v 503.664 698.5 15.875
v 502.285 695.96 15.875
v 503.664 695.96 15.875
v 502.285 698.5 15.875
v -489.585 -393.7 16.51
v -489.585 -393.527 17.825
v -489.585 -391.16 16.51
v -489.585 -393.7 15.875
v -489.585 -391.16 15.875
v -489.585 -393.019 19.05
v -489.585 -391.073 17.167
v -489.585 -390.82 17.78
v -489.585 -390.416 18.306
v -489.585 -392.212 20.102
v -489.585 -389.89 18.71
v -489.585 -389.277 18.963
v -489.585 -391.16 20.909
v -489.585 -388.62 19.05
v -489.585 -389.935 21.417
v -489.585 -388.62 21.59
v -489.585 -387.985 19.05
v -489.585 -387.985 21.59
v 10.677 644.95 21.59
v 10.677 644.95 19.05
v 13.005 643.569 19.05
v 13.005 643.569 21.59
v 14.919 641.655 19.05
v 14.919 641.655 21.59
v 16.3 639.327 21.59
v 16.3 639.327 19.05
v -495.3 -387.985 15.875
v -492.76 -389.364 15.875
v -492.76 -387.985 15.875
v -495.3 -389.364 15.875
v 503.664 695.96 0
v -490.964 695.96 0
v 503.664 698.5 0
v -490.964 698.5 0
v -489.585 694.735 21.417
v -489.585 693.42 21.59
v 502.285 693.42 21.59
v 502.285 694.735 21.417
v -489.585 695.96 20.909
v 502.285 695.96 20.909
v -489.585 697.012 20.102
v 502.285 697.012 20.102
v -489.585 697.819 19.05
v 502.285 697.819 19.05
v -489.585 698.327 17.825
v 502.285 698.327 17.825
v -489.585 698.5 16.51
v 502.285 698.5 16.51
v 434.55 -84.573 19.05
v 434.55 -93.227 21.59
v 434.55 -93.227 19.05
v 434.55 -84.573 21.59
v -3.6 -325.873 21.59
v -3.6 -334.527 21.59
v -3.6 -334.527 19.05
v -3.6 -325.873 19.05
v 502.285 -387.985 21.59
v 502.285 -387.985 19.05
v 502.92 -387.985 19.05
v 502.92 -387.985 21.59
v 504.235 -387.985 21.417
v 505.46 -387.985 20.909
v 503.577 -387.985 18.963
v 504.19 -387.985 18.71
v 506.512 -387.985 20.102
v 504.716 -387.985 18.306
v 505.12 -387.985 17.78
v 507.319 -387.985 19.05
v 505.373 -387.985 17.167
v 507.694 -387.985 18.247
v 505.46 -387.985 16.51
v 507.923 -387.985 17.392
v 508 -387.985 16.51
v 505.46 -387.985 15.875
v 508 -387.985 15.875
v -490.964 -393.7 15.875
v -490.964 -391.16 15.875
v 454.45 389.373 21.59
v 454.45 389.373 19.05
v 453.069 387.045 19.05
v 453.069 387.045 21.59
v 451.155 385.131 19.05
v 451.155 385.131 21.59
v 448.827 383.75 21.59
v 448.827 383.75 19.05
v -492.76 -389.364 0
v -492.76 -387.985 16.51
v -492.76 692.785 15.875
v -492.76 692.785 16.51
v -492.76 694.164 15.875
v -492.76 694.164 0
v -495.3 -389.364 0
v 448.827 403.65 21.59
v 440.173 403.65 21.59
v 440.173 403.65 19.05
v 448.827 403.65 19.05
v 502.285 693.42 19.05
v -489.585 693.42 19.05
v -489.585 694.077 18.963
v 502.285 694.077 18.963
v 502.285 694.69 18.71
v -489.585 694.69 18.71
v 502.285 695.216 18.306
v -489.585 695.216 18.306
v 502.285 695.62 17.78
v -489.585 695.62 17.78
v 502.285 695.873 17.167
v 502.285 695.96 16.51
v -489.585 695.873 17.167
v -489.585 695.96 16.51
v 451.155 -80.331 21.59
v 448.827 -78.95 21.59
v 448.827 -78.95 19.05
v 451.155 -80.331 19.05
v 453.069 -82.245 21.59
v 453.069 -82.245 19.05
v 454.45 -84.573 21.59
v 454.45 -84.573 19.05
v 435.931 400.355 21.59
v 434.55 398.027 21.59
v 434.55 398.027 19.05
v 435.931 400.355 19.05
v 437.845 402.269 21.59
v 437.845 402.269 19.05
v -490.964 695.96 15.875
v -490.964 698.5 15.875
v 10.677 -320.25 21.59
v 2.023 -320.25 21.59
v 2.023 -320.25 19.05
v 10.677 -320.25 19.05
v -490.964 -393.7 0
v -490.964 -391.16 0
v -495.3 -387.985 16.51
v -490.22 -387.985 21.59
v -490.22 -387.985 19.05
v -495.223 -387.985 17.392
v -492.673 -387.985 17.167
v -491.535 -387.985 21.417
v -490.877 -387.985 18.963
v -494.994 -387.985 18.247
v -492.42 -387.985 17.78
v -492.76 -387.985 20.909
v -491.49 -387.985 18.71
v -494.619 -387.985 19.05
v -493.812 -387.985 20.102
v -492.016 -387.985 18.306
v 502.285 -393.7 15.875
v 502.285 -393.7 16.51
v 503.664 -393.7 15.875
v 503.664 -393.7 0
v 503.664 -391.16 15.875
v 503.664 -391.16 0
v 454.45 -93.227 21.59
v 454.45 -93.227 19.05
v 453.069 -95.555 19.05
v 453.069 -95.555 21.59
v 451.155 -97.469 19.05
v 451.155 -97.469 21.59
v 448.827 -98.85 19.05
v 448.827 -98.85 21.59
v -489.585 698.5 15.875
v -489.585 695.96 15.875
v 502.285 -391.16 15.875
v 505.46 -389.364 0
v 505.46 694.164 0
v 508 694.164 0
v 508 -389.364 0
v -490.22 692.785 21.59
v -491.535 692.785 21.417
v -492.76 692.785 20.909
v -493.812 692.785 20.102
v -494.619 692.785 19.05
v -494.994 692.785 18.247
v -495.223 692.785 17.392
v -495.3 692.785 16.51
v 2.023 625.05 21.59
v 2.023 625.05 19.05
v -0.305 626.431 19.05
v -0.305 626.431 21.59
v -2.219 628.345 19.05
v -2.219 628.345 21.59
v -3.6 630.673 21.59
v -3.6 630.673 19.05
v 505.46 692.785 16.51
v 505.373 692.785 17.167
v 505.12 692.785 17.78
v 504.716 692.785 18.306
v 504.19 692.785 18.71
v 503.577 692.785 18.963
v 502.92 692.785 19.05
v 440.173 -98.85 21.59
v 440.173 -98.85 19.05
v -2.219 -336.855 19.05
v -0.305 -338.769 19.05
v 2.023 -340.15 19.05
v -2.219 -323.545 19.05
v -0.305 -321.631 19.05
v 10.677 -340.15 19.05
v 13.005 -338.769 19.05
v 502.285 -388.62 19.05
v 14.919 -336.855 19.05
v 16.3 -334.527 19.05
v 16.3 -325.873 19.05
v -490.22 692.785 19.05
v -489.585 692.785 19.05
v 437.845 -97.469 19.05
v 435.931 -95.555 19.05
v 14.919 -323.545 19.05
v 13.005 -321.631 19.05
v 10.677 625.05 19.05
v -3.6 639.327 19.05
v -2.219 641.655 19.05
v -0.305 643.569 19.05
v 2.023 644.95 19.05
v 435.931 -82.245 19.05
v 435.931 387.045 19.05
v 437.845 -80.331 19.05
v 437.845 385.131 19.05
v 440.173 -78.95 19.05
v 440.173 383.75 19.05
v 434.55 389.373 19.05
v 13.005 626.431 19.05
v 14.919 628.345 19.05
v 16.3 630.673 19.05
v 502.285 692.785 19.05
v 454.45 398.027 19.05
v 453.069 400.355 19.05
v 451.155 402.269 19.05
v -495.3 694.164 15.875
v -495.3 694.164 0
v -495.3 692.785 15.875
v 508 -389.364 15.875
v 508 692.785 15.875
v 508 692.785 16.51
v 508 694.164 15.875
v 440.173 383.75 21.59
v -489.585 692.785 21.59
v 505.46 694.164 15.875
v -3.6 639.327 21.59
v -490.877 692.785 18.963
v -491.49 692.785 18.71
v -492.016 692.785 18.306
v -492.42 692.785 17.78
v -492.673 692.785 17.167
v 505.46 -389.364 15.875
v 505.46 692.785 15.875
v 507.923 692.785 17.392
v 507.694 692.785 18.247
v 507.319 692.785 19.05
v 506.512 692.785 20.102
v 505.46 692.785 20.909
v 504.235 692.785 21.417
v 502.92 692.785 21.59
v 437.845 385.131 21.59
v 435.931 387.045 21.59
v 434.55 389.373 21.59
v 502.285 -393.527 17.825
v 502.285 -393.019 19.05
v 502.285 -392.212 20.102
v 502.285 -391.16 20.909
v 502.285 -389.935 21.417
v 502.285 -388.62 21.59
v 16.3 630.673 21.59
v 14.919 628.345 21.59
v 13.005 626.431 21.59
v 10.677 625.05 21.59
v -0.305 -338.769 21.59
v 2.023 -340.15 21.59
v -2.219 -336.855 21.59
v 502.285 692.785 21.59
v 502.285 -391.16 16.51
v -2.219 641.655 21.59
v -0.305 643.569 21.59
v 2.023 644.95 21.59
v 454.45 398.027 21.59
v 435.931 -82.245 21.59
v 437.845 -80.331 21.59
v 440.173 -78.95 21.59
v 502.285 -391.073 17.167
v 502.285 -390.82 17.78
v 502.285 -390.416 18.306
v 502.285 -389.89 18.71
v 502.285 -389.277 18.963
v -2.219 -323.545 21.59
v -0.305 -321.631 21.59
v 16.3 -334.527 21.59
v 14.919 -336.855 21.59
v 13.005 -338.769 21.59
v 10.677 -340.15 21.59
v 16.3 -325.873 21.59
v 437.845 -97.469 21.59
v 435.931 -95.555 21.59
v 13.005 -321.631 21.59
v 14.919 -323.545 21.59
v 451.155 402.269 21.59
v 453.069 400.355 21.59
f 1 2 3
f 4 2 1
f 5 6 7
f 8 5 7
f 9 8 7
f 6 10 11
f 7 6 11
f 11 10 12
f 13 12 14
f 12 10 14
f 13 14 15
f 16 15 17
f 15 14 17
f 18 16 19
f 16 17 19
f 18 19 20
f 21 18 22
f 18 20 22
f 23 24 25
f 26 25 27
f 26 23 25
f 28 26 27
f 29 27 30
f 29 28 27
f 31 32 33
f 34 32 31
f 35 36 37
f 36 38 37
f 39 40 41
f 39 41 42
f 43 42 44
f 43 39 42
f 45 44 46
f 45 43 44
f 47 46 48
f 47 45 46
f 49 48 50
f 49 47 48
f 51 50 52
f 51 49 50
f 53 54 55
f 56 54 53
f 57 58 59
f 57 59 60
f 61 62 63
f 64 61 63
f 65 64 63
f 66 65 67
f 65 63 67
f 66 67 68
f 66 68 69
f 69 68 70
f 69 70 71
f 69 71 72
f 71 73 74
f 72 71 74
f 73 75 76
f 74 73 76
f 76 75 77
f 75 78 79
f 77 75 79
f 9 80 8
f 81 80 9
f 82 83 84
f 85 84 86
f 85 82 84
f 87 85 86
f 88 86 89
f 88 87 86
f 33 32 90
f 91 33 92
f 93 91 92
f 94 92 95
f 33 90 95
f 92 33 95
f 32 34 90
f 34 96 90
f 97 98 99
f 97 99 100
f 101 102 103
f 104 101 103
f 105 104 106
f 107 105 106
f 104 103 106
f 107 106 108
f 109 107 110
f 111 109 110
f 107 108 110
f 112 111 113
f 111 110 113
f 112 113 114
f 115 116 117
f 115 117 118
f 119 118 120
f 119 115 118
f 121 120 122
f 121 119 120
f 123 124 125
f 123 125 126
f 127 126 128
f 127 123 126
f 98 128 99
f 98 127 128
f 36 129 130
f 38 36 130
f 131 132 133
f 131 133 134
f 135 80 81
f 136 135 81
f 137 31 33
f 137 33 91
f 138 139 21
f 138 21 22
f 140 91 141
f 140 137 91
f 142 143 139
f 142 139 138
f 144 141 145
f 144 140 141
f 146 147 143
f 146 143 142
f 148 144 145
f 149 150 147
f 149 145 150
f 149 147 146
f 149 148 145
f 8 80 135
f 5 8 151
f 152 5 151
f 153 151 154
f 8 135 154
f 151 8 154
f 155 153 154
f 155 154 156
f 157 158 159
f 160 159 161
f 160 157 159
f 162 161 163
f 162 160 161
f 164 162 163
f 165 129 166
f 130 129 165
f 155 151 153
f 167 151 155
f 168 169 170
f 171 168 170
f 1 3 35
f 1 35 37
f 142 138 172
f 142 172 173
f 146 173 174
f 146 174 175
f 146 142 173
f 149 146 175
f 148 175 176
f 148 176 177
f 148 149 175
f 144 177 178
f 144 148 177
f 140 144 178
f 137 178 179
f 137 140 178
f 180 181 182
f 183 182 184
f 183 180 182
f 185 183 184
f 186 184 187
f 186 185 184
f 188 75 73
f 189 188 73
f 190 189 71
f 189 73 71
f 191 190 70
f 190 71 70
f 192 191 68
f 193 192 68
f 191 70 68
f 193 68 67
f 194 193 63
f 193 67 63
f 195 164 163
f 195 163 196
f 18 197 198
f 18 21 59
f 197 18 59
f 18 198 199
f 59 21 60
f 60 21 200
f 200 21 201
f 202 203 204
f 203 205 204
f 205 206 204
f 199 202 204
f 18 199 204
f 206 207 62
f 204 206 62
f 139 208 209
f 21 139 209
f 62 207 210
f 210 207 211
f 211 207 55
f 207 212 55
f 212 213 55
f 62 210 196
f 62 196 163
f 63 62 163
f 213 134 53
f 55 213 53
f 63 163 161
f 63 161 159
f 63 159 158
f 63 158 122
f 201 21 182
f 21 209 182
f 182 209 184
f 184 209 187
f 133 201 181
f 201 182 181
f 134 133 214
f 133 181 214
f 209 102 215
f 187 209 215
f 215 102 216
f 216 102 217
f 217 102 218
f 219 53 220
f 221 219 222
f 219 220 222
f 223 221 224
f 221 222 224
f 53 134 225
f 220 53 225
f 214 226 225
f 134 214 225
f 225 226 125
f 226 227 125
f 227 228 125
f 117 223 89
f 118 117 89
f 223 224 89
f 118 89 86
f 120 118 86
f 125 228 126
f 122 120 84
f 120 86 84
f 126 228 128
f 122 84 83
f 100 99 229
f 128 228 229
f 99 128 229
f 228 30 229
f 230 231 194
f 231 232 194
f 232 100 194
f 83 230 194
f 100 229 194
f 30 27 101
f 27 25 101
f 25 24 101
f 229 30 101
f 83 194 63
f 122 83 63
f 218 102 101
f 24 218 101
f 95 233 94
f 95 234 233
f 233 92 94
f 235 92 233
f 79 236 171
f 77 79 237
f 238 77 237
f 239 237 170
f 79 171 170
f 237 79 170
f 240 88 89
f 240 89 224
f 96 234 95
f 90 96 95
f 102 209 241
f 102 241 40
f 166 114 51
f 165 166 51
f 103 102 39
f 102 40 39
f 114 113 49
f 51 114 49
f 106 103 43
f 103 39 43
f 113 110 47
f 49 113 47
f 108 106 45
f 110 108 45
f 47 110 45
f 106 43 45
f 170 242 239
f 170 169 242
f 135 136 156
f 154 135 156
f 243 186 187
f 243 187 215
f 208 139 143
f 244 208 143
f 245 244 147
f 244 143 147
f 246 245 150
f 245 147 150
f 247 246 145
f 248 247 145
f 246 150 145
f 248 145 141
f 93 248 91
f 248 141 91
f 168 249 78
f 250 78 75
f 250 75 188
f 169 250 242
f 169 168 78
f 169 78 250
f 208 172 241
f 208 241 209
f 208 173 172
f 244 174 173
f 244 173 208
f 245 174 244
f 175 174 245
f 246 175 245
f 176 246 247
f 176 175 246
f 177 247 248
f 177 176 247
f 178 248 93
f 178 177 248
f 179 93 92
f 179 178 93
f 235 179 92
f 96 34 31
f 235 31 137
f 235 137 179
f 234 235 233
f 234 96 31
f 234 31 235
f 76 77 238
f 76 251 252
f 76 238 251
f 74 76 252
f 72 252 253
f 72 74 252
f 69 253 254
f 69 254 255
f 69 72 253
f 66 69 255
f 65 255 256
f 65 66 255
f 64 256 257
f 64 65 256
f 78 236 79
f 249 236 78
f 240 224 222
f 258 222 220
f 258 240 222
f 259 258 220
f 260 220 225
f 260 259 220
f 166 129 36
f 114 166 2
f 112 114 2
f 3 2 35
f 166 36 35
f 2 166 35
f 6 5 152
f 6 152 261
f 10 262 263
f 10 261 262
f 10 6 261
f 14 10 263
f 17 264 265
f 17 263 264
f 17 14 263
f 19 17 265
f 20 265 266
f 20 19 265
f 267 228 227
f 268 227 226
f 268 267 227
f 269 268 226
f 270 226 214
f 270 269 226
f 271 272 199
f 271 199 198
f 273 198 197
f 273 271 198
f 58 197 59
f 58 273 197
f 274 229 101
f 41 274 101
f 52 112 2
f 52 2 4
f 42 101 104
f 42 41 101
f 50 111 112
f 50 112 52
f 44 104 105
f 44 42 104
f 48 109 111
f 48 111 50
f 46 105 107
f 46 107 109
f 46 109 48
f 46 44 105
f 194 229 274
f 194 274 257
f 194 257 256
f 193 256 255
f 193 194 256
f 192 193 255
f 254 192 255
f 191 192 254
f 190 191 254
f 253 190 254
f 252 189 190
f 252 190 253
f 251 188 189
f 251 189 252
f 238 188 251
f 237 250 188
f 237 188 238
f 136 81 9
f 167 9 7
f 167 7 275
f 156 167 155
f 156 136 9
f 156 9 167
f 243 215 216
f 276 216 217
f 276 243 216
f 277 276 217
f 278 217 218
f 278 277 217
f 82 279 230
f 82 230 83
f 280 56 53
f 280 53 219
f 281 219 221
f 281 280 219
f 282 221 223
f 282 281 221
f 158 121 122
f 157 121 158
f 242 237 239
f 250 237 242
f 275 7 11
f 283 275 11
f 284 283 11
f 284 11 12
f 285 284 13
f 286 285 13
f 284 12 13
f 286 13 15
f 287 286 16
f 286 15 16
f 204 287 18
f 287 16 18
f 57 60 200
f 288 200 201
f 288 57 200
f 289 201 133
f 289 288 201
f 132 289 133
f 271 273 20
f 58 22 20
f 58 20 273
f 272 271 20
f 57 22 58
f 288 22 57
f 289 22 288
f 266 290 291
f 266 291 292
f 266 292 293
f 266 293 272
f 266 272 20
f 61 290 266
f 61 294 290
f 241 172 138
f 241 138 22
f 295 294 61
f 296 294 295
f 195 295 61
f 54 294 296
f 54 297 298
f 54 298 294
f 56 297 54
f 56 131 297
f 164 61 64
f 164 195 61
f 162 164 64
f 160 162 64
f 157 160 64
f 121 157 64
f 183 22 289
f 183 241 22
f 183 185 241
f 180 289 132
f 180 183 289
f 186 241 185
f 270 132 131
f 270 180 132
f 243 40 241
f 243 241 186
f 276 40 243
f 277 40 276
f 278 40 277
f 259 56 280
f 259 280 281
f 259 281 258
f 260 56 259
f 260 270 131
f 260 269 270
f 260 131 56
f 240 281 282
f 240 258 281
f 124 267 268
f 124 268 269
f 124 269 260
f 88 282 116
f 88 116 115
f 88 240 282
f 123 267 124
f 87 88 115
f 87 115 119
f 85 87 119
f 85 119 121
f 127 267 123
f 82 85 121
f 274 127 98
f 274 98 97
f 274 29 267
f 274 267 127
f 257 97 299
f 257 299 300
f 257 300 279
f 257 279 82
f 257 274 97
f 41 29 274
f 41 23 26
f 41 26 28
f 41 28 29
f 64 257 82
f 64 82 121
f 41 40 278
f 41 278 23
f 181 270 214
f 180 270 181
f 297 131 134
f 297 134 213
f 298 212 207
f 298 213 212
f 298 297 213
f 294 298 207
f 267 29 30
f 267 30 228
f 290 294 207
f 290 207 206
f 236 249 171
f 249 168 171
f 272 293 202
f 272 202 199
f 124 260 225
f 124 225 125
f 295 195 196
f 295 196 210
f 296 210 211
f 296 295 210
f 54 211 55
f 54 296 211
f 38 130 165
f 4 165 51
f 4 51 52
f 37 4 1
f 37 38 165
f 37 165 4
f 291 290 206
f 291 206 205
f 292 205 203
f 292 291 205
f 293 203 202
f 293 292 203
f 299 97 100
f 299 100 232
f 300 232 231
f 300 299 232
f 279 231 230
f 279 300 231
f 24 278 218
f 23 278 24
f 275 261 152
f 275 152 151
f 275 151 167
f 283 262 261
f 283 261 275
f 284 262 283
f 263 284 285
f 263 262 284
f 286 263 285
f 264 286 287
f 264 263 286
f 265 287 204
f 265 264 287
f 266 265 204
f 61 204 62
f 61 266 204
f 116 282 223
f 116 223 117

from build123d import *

# Parameters (mm, degrees)
SKETCH1_W               = 1003.3
SKETCH1_H               = 1092.2
SKETCH1_W_2             = 998.22
SKETCH1_H_2             = 1087.12
BOSS_EXTRUDE1_DEPTH     = 21.59
SKETCH3_W               = 1003.3
SKETCH3_H               = 1092.2
BOSS_EXTRUDE2_DEPTH     = 2.54
CUT_EXTRUDE1_REACH      = 865.963
CONVERT_SOLID1_START    = -495.3
CONVERT_SOLID1_DEPTH    = 1003.3
CONVERT_SOLID1_2_DEPTH  = 4.336051224
CONVERT_SOLID1_START_2  = 503.663948776
CONVERT_SOLID1_3_DEPTH  = 4.336051224
CONVERT_SOLID1_START_3  = -490.963948776
CONVERT_SOLID1_4_DEPTH  = 1.378948776
CONVERT_SOLID1_START_4  = 502.285
CONVERT_SOLID1_5_DEPTH  = 1.378948776
CONVERT_SOLID1_START_5  = -489.585
CONVERT_SOLID1_6_DEPTH  = 991.87
CONVERT_SOLID1_START_6  = -391.16
CONVERT_SOLID1_7_DEPTH  = 1087.12
CONVERT_SOLID1_8_DEPTH  = 1.796051224
CONVERT_SOLID1_START_7  = 694.163948776
CONVERT_SOLID1_9_DEPTH  = 1.796051224
CONVERT_SOLID1_START_8  = -389.363948776
CONVERT_SOLID1_10_DEPTH = 1.378948776
CONVERT_SOLID1_START_9  = 692.785
CONVERT_SOLID1_11_DEPTH = 1.378948776
CONVERT_SOLID1_START_10 = -387.985
CONVERT_SOLID1_12_DEPTH = 1080.77


with BuildPart() as part:
    # Sketch1 → Boss-Extrude1 (new body)
    with BuildSketch(Plane.XY):
        with Locations((6.35, 152.4)):
            Rectangle(SKETCH1_W, SKETCH1_H)
        with Locations((6.35, 152.4)):
            Rectangle(SKETCH1_W_2, SKETCH1_H_2, mode=Mode.SUBTRACT)
    extrude(amount=BOSS_EXTRUDE1_DEPTH)

    # Sketch3 → Boss-Extrude2 (add)
    with BuildSketch(Plane.XY.offset(21.59)):
        with Locations((6.35, 152.4)):
            Rectangle(SKETCH3_W, SKETCH3_H)
    extrude(amount=-BOSS_EXTRUDE2_DEPTH)

    # Sketch4 → Cut-Extrude1 (cut, up to next)
    with BuildSketch(Plane.XY.offset(21.59), mode=Mode.PRIVATE) as cut_extrude1_sk1:
        with BuildLine():
            Line((440.173338469, 403.65), (448.826661531, 403.65))
            ThreePointArc((448.826661531, 403.65), (452.172108576, 401.372108576), (454.45, 398.026661531))
            Line((454.45, 398.026661531), (454.45, 389.373338469))
            ThreePointArc((454.45, 389.373338469), (452.172108576, 386.027891424), (448.826661531, 383.75))
            Line((448.826661531, 383.75), (440.173338469, 383.75))
            ThreePointArc((440.173338469, 383.75), (436.827891424, 386.027891424), (434.55, 389.373338469))
            Line((434.55, 389.373338469), (434.55, 398.026661531))
            ThreePointArc((434.55, 398.026661531), (436.827891424, 401.372108576), (440.173338469, 403.65))
        make_face()
    cut_extrude1_tool1 = extrude(cut_extrude1_sk1.sketch, amount=-CUT_EXTRUDE1_REACH, mode=Mode.PRIVATE) & part.part
    # Sketch4 → Cut-Extrude1 (cut, up to next)
    with BuildSketch(Plane.XY.offset(21.59), mode=Mode.PRIVATE) as cut_extrude1_sk2:
        with BuildLine():
            Line((440.173338469, -78.95), (448.826661531, -78.95))
            ThreePointArc((448.826661531, -78.95), (452.172108576, -81.227891424), (454.45, -84.573338469))
            Line((454.45, -84.573338469), (454.45, -93.226661531))
            ThreePointArc((454.45, -93.226661531), (452.172108576, -96.572108576), (448.826661531, -98.85))
            Line((448.826661531, -98.85), (440.173338469, -98.85))
            ThreePointArc((440.173338469, -98.85), (436.827891424, -96.572108576), (434.55, -93.226661531))
            Line((434.55, -93.226661531), (434.55, -84.573338469))
            ThreePointArc((434.55, -84.573338469), (436.827891424, -81.227891424), (440.173338469, -78.95))
        make_face()
    cut_extrude1_tool2 = extrude(cut_extrude1_sk2.sketch, amount=-CUT_EXTRUDE1_REACH, mode=Mode.PRIVATE) & part.part
    # Sketch4 → Cut-Extrude1 (cut, up to next)
    with BuildSketch(Plane.XY.offset(21.59), mode=Mode.PRIVATE) as cut_extrude1_sk3:
        with BuildLine():
            Line((2.023338469, 644.95), (10.676661531, 644.95))
            ThreePointArc((10.676661531, 644.95), (14.022108576, 642.672108576), (16.3, 639.326661531))
            Line((16.3, 639.326661531), (16.3, 630.673338469))
            ThreePointArc((16.3, 630.673338469), (14.022108576, 627.327891424), (10.676661531, 625.05))
            Line((10.676661531, 625.05), (2.023338469, 625.05))
            ThreePointArc((2.023338469, 625.05), (-1.322108576, 627.327891424), (-3.6, 630.673338469))
            Line((-3.6, 630.673338469), (-3.6, 639.326661531))
            ThreePointArc((-3.6, 639.326661531), (-1.322108576, 642.672108576), (2.023338469, 644.95))
        make_face()
    cut_extrude1_tool3 = extrude(cut_extrude1_sk3.sketch, amount=-CUT_EXTRUDE1_REACH, mode=Mode.PRIVATE) & part.part
    # Sketch4 → Cut-Extrude1 (cut, up to next)
    with BuildSketch(Plane.XY.offset(21.59), mode=Mode.PRIVATE) as cut_extrude1_sk4:
        with BuildLine():
            Line((2.023338469, -320.25), (10.676661531, -320.25))
            ThreePointArc((10.676661531, -320.25), (14.022108576, -322.527891424), (16.3, -325.873338469))
            Line((16.3, -325.873338469), (16.3, -334.526661531))
            ThreePointArc((16.3, -334.526661531), (14.022108576, -337.872108576), (10.676661531, -340.15))
            Line((10.676661531, -340.15), (2.023338469, -340.15))
            ThreePointArc((2.023338469, -340.15), (-1.322108576, -337.872108576), (-3.6, -334.526661531))
            Line((-3.6, -334.526661531), (-3.6, -325.873338469))
            ThreePointArc((-3.6, -325.873338469), (-1.322108576, -322.527891424), (2.023338469, -320.25))
        make_face()
    cut_extrude1_tool4 = extrude(cut_extrude1_sk4.sketch, amount=-CUT_EXTRUDE1_REACH, mode=Mode.PRIVATE) & part.part
    add(cut_extrude1_tool1.solids().sort_by_distance((444.5, 393.7, 21.59))[0], mode=Mode.SUBTRACT)
    add(cut_extrude1_tool2.solids().sort_by_distance((444.5, -88.9, 21.59))[0], mode=Mode.SUBTRACT)
    add(cut_extrude1_tool3.solids().sort_by_distance((6.35, 635, 21.59))[0], mode=Mode.SUBTRACT)
    add(cut_extrude1_tool4.solids().sort_by_distance((6.35, -330.2, 21.59))[0], mode=Mode.SUBTRACT)

    # Convert-Solid1: read off the stored shape, not the designer's step
    # Convert-Solid1 outline → Convert-Solid1 (cut)
    with BuildSketch(Plane.YZ.offset(CONVERT_SOLID1_START)):
        with BuildLine():
            ThreePointArc((-393.7, 16.51), (-392.212102448, 20.102102448), (-388.62, 21.59))
            Line((-388.62, 21.59), (-393.7, 21.59))
            Line((-393.7, 21.59), (-393.7, 16.51))
        make_face()
        with BuildLine():
            Line((698.5, 21.59), (693.42, 21.59))
            ThreePointArc((693.42, 21.59), (697.012102448, 20.102102448), (698.5, 16.51))
            Line((698.5, 16.51), (698.5, 21.59))
        make_face()
    extrude(amount=CONVERT_SOLID1_DEPTH, mode=Mode.SUBTRACT)

    # Convert-Solid1 2 outline → Convert-Solid1 2 (cut)
    with BuildSketch(Plane.YZ.offset(CONVERT_SOLID1_START)):
        with BuildLine():
            Line((-388.62, 19.05), (-387.985, 19.05))
            Line((-387.985, 19.05), (-387.985, 21.59))
            Line((-387.985, 21.59), (-388.62, 21.59))
            ThreePointArc((-388.62, 21.59), (-392.212102448, 20.102102448), (-393.7, 16.51))
            Line((-393.7, 16.51), (-393.7, 0))
            Line((-393.7, 0), (-391.16, 0))
            Line((-391.16, 0), (-391.16, 16.51))
            ThreePointArc((-391.16, 16.51), (-390.416051224, 18.306051224), (-388.62, 19.05))
        make_face()
        with BuildLine():
            Line((692.785, 21.59), (692.785, 19.05))
            Line((692.785, 19.05), (693.42, 19.05))
            ThreePointArc((693.42, 19.05), (695.216051224, 18.306051224), (695.96, 16.51))
            Line((695.96, 16.51), (695.96, 0))
            Line((695.96, 0), (698.5, 0))
            Line((698.5, 0), (698.5, 16.51))
            ThreePointArc((698.5, 16.51), (697.012102448, 20.102102448), (693.42, 21.59))
            Line((693.42, 21.59), (692.785, 21.59))
        make_face()
    extrude(amount=CONVERT_SOLID1_2_DEPTH, mode=Mode.SUBTRACT)

    # Convert-Solid1 3 outline → Convert-Solid1 3 (cut)
    with BuildSketch(Plane.YZ.offset(CONVERT_SOLID1_START_2)):
        with BuildLine():
            Line((-388.62, 19.05), (-387.985, 19.05))
            Line((-387.985, 19.05), (-387.985, 21.59))
            Line((-387.985, 21.59), (-388.62, 21.59))
            ThreePointArc((-388.62, 21.59), (-392.212102448, 20.102102448), (-393.7, 16.51))
            Line((-393.7, 16.51), (-393.7, 0))
            Line((-393.7, 0), (-391.16, 0))
            Line((-391.16, 0), (-391.16, 16.51))
            ThreePointArc((-391.16, 16.51), (-390.416051224, 18.306051224), (-388.62, 19.05))
        make_face()
        with BuildLine():
            Line((692.785, 21.59), (692.785, 19.05))
            Line((692.785, 19.05), (693.42, 19.05))
            ThreePointArc((693.42, 19.05), (695.216051224, 18.306051224), (695.96, 16.51))
            Line((695.96, 16.51), (695.96, 0))
            Line((695.96, 0), (698.5, 0))
            Line((698.5, 0), (698.5, 16.51))
            ThreePointArc((698.5, 16.51), (697.012102448, 20.102102448), (693.42, 21.59))
            Line((693.42, 21.59), (692.785, 21.59))
        make_face()
    extrude(amount=CONVERT_SOLID1_3_DEPTH, mode=Mode.SUBTRACT)

    # Convert-Solid1 4 outline → Convert-Solid1 4 (cut)
    with BuildSketch(Plane.YZ.offset(CONVERT_SOLID1_START_3)):
        with BuildLine():
            Line((-391.16, 19.05), (-387.985, 19.05))
            Line((-387.985, 19.05), (-387.985, 21.59))
            Line((-387.985, 21.59), (-388.62, 21.59))
            ThreePointArc((-388.62, 21.59), (-392.212102448, 20.102102448), (-393.7, 16.51))
            Line((-393.7, 16.51), (-393.7, 15.875))
            Line((-393.7, 15.875), (-391.16, 15.875))
            Line((-391.16, 15.875), (-391.16, 19.05))
        make_face()
        with BuildLine():
            Line((692.785, 21.59), (692.785, 19.05))
            Line((692.785, 19.05), (695.96, 19.05))
            Line((695.96, 19.05), (695.96, 15.875))
            Line((695.96, 15.875), (698.5, 15.875))
            Line((698.5, 15.875), (698.5, 16.51))
            ThreePointArc((698.5, 16.51), (697.012102448, 20.102102448), (693.42, 21.59))
            Line((693.42, 21.59), (692.785, 21.59))
        make_face()
    extrude(amount=CONVERT_SOLID1_4_DEPTH, mode=Mode.SUBTRACT)

    # Convert-Solid1 5 outline → Convert-Solid1 5 (cut)
    with BuildSketch(Plane.YZ.offset(CONVERT_SOLID1_START_4)):
        with BuildLine():
            Line((-391.16, 19.05), (-387.985, 19.05))
            Line((-387.985, 19.05), (-387.985, 21.59))
            Line((-387.985, 21.59), (-388.62, 21.59))
            ThreePointArc((-388.62, 21.59), (-392.212102448, 20.102102448), (-393.7, 16.51))
            Line((-393.7, 16.51), (-393.7, 15.875))
            Line((-393.7, 15.875), (-391.16, 15.875))
            Line((-391.16, 15.875), (-391.16, 19.05))
        make_face()
        with BuildLine():
            Line((692.785, 21.59), (692.785, 19.05))
            Line((692.785, 19.05), (695.96, 19.05))
            Line((695.96, 19.05), (695.96, 15.875))
            Line((695.96, 15.875), (698.5, 15.875))
            Line((698.5, 15.875), (698.5, 16.51))
            ThreePointArc((698.5, 16.51), (697.012102448, 20.102102448), (693.42, 21.59))
            Line((693.42, 21.59), (692.785, 21.59))
        make_face()
    extrude(amount=CONVERT_SOLID1_5_DEPTH, mode=Mode.SUBTRACT)

    # Convert-Solid1 6 outline → Convert-Solid1 6 (add)
    with BuildSketch(Plane.YZ.offset(CONVERT_SOLID1_START_5)):
        with BuildLine():
            ThreePointArc((-391.16, 16.51), (-390.416051224, 18.306051224), (-388.62, 19.05))
            Line((-388.62, 19.05), (-391.16, 19.05))
            Line((-391.16, 19.05), (-391.16, 16.51))
        make_face()
        with BuildLine():
            Line((695.96, 19.05), (693.42, 19.05))
            ThreePointArc((693.42, 19.05), (695.216051224, 18.306051224), (695.96, 16.51))
            Line((695.96, 16.51), (695.96, 19.05))
        make_face()
    extrude(amount=CONVERT_SOLID1_6_DEPTH)

    # Convert-Solid1 7 outline → Convert-Solid1 7 (cut)
    with BuildSketch(Plane(origin=(0, 0, 0), x_dir=(1, 0, 0), z_dir=(0, 1, 0)).offset(CONVERT_SOLID1_START_6)):
        with BuildLine():
            ThreePointArc((508, -16.51), (506.512102448, -20.102102448), (502.92, -21.59))
            Line((502.92, -21.59), (508, -21.59))
            Line((508, -21.59), (508, -16.51))
        make_face()
        with BuildLine():
            Line((-495.3, -21.59), (-490.22, -21.59))
            ThreePointArc((-490.22, -21.59), (-493.812102448, -20.102102448), (-495.3, -16.51))
            Line((-495.3, -16.51), (-495.3, -21.59))
        make_face()
    extrude(amount=CONVERT_SOLID1_7_DEPTH, mode=Mode.SUBTRACT)

    # Convert-Solid1 8 outline → Convert-Solid1 8 (cut)
    with BuildSketch(Plane(origin=(0, 0, 0), x_dir=(1, 0, 0), z_dir=(0, 1, 0)).offset(CONVERT_SOLID1_START_6)):
        with BuildLine():
            Line((508, -16.51), (508, 0))
            Line((508, 0), (505.46, 0))
            Line((505.46, 0), (505.46, -19.05))
            Line((505.46, -19.05), (507.319409051, -19.05))
            ThreePointArc((507.319409051, -19.05), (507.826903197, -17.824800749), (508, -16.51))
        make_face()
        with BuildLine():
            Line((-492.76, -19.05), (-492.76, 0))
            Line((-492.76, 0), (-495.3, 0))
            Line((-495.3, 0), (-495.3, -16.51))
            ThreePointArc((-495.3, -16.51), (-495.126903197, -17.824800749), (-494.619409051, -19.05))
            Line((-494.619409051, -19.05), (-492.76, -19.05))
        make_face()
    extrude(amount=CONVERT_SOLID1_8_DEPTH, mode=Mode.SUBTRACT)

    # Convert-Solid1 9 outline → Convert-Solid1 9 (cut)
    with BuildSketch(Plane(origin=(0, 0, 0), x_dir=(1, 0, 0), z_dir=(0, 1, 0)).offset(CONVERT_SOLID1_START_7)):
        with BuildLine():
            Line((508, -16.51), (508, 0))
            Line((508, 0), (505.46, 0))
            Line((505.46, 0), (505.46, -19.05))
            Line((505.46, -19.05), (507.319409051, -19.05))
            ThreePointArc((507.319409051, -19.05), (507.826903197, -17.824800749), (508, -16.51))
        make_face()
        with BuildLine():
            Line((-492.76, -19.05), (-492.76, 0))
            Line((-492.76, 0), (-495.3, 0))
            Line((-495.3, 0), (-495.3, -16.51))
            ThreePointArc((-495.3, -16.51), (-495.126903197, -17.824800749), (-494.619409051, -19.05))
            Line((-494.619409051, -19.05), (-492.76, -19.05))
        make_face()
    extrude(amount=CONVERT_SOLID1_9_DEPTH, mode=Mode.SUBTRACT)

    # Convert-Solid1 10 outline → Convert-Solid1 10 (cut)
    with BuildSketch(Plane(origin=(0, 0, 0), x_dir=(1, 0, 0), z_dir=(0, 1, 0)).offset(CONVERT_SOLID1_START_8)):
        with BuildLine():
            Line((508, -16.51), (508, -15.875))
            Line((508, -15.875), (505.46, -15.875))
            Line((505.46, -15.875), (505.46, -19.05))
            Line((505.46, -19.05), (507.319409051, -19.05))
            ThreePointArc((507.319409051, -19.05), (507.826903197, -17.824800749), (508, -16.51))
        make_face()
        with BuildLine():
            Line((-492.76, -19.05), (-492.76, -15.875))
            Line((-492.76, -15.875), (-495.3, -15.875))
            Line((-495.3, -15.875), (-495.3, -16.51))
            ThreePointArc((-495.3, -16.51), (-495.126903197, -17.824800749), (-494.619409051, -19.05))
            Line((-494.619409051, -19.05), (-492.76, -19.05))
        make_face()
    extrude(amount=CONVERT_SOLID1_10_DEPTH, mode=Mode.SUBTRACT)

    # Convert-Solid1 11 outline → Convert-Solid1 11 (cut)
    with BuildSketch(Plane(origin=(0, 0, 0), x_dir=(1, 0, 0), z_dir=(0, 1, 0)).offset(CONVERT_SOLID1_START_9)):
        with BuildLine():
            Line((508, -16.51), (508, -15.875))
            Line((508, -15.875), (505.46, -15.875))
            Line((505.46, -15.875), (505.46, -19.05))
            Line((505.46, -19.05), (507.319409051, -19.05))
            ThreePointArc((507.319409051, -19.05), (507.826903197, -17.824800749), (508, -16.51))
        make_face()
        with BuildLine():
            Line((-492.76, -19.05), (-492.76, -15.875))
            Line((-492.76, -15.875), (-495.3, -15.875))
            Line((-495.3, -15.875), (-495.3, -16.51))
            ThreePointArc((-495.3, -16.51), (-495.126903197, -17.824800749), (-494.619409051, -19.05))
            Line((-494.619409051, -19.05), (-492.76, -19.05))
        make_face()
    extrude(amount=CONVERT_SOLID1_11_DEPTH, mode=Mode.SUBTRACT)

    # Convert-Solid1 12 outline → Convert-Solid1 12 (add)
    with BuildSketch(Plane(origin=(0, 0, 0), x_dir=(1, 0, 0), z_dir=(0, 1, 0)).offset(CONVERT_SOLID1_START_10)):
        with BuildLine():
            Line((505.46, -19.05), (505.46, -16.51))
            ThreePointArc((505.46, -16.51), (504.716051224, -18.306051224), (502.92, -19.05))
            Line((502.92, -19.05), (505.46, -19.05))
        make_face()
        with BuildLine():
            Line((-492.76, -19.05), (-490.22, -19.05))
            ThreePointArc((-490.22, -19.05), (-492.016051224, -18.306051224), (-492.76, -16.51))
            Line((-492.76, -16.51), (-492.76, -19.05))
        make_face()
    extrude(amount=CONVERT_SOLID1_12_DEPTH)


solid = part.part
